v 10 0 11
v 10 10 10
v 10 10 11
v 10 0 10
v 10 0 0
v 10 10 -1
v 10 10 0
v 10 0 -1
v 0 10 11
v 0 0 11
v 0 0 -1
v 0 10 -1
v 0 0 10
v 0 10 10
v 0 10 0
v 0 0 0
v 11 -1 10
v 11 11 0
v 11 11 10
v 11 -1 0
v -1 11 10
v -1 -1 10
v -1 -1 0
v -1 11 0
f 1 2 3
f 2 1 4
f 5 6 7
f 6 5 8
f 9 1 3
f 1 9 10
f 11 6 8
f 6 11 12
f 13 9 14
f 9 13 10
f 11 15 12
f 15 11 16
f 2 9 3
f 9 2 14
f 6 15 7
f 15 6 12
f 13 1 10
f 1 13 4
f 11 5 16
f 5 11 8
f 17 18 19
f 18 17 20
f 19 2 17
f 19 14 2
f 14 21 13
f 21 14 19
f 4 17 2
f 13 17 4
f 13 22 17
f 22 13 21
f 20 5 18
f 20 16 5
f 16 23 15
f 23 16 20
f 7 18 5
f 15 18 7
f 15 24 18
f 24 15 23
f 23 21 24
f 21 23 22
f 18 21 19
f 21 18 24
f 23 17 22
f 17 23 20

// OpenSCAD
// Unit of length: Unit.MM
union()
{
   color(c = [1.0, 0.0, 0.0, 1.0])
   {
      translate(v = [0.0, 0.0, -1.0])
      {
         cube(size = [10.0, 10.0, 12.0], center = false);
      }
   }
   translate(v = [-1.0, -1.0, 0.0])
   {
      cube(size = [12.0, 12.0, 10.0], center = false);
   }
}
